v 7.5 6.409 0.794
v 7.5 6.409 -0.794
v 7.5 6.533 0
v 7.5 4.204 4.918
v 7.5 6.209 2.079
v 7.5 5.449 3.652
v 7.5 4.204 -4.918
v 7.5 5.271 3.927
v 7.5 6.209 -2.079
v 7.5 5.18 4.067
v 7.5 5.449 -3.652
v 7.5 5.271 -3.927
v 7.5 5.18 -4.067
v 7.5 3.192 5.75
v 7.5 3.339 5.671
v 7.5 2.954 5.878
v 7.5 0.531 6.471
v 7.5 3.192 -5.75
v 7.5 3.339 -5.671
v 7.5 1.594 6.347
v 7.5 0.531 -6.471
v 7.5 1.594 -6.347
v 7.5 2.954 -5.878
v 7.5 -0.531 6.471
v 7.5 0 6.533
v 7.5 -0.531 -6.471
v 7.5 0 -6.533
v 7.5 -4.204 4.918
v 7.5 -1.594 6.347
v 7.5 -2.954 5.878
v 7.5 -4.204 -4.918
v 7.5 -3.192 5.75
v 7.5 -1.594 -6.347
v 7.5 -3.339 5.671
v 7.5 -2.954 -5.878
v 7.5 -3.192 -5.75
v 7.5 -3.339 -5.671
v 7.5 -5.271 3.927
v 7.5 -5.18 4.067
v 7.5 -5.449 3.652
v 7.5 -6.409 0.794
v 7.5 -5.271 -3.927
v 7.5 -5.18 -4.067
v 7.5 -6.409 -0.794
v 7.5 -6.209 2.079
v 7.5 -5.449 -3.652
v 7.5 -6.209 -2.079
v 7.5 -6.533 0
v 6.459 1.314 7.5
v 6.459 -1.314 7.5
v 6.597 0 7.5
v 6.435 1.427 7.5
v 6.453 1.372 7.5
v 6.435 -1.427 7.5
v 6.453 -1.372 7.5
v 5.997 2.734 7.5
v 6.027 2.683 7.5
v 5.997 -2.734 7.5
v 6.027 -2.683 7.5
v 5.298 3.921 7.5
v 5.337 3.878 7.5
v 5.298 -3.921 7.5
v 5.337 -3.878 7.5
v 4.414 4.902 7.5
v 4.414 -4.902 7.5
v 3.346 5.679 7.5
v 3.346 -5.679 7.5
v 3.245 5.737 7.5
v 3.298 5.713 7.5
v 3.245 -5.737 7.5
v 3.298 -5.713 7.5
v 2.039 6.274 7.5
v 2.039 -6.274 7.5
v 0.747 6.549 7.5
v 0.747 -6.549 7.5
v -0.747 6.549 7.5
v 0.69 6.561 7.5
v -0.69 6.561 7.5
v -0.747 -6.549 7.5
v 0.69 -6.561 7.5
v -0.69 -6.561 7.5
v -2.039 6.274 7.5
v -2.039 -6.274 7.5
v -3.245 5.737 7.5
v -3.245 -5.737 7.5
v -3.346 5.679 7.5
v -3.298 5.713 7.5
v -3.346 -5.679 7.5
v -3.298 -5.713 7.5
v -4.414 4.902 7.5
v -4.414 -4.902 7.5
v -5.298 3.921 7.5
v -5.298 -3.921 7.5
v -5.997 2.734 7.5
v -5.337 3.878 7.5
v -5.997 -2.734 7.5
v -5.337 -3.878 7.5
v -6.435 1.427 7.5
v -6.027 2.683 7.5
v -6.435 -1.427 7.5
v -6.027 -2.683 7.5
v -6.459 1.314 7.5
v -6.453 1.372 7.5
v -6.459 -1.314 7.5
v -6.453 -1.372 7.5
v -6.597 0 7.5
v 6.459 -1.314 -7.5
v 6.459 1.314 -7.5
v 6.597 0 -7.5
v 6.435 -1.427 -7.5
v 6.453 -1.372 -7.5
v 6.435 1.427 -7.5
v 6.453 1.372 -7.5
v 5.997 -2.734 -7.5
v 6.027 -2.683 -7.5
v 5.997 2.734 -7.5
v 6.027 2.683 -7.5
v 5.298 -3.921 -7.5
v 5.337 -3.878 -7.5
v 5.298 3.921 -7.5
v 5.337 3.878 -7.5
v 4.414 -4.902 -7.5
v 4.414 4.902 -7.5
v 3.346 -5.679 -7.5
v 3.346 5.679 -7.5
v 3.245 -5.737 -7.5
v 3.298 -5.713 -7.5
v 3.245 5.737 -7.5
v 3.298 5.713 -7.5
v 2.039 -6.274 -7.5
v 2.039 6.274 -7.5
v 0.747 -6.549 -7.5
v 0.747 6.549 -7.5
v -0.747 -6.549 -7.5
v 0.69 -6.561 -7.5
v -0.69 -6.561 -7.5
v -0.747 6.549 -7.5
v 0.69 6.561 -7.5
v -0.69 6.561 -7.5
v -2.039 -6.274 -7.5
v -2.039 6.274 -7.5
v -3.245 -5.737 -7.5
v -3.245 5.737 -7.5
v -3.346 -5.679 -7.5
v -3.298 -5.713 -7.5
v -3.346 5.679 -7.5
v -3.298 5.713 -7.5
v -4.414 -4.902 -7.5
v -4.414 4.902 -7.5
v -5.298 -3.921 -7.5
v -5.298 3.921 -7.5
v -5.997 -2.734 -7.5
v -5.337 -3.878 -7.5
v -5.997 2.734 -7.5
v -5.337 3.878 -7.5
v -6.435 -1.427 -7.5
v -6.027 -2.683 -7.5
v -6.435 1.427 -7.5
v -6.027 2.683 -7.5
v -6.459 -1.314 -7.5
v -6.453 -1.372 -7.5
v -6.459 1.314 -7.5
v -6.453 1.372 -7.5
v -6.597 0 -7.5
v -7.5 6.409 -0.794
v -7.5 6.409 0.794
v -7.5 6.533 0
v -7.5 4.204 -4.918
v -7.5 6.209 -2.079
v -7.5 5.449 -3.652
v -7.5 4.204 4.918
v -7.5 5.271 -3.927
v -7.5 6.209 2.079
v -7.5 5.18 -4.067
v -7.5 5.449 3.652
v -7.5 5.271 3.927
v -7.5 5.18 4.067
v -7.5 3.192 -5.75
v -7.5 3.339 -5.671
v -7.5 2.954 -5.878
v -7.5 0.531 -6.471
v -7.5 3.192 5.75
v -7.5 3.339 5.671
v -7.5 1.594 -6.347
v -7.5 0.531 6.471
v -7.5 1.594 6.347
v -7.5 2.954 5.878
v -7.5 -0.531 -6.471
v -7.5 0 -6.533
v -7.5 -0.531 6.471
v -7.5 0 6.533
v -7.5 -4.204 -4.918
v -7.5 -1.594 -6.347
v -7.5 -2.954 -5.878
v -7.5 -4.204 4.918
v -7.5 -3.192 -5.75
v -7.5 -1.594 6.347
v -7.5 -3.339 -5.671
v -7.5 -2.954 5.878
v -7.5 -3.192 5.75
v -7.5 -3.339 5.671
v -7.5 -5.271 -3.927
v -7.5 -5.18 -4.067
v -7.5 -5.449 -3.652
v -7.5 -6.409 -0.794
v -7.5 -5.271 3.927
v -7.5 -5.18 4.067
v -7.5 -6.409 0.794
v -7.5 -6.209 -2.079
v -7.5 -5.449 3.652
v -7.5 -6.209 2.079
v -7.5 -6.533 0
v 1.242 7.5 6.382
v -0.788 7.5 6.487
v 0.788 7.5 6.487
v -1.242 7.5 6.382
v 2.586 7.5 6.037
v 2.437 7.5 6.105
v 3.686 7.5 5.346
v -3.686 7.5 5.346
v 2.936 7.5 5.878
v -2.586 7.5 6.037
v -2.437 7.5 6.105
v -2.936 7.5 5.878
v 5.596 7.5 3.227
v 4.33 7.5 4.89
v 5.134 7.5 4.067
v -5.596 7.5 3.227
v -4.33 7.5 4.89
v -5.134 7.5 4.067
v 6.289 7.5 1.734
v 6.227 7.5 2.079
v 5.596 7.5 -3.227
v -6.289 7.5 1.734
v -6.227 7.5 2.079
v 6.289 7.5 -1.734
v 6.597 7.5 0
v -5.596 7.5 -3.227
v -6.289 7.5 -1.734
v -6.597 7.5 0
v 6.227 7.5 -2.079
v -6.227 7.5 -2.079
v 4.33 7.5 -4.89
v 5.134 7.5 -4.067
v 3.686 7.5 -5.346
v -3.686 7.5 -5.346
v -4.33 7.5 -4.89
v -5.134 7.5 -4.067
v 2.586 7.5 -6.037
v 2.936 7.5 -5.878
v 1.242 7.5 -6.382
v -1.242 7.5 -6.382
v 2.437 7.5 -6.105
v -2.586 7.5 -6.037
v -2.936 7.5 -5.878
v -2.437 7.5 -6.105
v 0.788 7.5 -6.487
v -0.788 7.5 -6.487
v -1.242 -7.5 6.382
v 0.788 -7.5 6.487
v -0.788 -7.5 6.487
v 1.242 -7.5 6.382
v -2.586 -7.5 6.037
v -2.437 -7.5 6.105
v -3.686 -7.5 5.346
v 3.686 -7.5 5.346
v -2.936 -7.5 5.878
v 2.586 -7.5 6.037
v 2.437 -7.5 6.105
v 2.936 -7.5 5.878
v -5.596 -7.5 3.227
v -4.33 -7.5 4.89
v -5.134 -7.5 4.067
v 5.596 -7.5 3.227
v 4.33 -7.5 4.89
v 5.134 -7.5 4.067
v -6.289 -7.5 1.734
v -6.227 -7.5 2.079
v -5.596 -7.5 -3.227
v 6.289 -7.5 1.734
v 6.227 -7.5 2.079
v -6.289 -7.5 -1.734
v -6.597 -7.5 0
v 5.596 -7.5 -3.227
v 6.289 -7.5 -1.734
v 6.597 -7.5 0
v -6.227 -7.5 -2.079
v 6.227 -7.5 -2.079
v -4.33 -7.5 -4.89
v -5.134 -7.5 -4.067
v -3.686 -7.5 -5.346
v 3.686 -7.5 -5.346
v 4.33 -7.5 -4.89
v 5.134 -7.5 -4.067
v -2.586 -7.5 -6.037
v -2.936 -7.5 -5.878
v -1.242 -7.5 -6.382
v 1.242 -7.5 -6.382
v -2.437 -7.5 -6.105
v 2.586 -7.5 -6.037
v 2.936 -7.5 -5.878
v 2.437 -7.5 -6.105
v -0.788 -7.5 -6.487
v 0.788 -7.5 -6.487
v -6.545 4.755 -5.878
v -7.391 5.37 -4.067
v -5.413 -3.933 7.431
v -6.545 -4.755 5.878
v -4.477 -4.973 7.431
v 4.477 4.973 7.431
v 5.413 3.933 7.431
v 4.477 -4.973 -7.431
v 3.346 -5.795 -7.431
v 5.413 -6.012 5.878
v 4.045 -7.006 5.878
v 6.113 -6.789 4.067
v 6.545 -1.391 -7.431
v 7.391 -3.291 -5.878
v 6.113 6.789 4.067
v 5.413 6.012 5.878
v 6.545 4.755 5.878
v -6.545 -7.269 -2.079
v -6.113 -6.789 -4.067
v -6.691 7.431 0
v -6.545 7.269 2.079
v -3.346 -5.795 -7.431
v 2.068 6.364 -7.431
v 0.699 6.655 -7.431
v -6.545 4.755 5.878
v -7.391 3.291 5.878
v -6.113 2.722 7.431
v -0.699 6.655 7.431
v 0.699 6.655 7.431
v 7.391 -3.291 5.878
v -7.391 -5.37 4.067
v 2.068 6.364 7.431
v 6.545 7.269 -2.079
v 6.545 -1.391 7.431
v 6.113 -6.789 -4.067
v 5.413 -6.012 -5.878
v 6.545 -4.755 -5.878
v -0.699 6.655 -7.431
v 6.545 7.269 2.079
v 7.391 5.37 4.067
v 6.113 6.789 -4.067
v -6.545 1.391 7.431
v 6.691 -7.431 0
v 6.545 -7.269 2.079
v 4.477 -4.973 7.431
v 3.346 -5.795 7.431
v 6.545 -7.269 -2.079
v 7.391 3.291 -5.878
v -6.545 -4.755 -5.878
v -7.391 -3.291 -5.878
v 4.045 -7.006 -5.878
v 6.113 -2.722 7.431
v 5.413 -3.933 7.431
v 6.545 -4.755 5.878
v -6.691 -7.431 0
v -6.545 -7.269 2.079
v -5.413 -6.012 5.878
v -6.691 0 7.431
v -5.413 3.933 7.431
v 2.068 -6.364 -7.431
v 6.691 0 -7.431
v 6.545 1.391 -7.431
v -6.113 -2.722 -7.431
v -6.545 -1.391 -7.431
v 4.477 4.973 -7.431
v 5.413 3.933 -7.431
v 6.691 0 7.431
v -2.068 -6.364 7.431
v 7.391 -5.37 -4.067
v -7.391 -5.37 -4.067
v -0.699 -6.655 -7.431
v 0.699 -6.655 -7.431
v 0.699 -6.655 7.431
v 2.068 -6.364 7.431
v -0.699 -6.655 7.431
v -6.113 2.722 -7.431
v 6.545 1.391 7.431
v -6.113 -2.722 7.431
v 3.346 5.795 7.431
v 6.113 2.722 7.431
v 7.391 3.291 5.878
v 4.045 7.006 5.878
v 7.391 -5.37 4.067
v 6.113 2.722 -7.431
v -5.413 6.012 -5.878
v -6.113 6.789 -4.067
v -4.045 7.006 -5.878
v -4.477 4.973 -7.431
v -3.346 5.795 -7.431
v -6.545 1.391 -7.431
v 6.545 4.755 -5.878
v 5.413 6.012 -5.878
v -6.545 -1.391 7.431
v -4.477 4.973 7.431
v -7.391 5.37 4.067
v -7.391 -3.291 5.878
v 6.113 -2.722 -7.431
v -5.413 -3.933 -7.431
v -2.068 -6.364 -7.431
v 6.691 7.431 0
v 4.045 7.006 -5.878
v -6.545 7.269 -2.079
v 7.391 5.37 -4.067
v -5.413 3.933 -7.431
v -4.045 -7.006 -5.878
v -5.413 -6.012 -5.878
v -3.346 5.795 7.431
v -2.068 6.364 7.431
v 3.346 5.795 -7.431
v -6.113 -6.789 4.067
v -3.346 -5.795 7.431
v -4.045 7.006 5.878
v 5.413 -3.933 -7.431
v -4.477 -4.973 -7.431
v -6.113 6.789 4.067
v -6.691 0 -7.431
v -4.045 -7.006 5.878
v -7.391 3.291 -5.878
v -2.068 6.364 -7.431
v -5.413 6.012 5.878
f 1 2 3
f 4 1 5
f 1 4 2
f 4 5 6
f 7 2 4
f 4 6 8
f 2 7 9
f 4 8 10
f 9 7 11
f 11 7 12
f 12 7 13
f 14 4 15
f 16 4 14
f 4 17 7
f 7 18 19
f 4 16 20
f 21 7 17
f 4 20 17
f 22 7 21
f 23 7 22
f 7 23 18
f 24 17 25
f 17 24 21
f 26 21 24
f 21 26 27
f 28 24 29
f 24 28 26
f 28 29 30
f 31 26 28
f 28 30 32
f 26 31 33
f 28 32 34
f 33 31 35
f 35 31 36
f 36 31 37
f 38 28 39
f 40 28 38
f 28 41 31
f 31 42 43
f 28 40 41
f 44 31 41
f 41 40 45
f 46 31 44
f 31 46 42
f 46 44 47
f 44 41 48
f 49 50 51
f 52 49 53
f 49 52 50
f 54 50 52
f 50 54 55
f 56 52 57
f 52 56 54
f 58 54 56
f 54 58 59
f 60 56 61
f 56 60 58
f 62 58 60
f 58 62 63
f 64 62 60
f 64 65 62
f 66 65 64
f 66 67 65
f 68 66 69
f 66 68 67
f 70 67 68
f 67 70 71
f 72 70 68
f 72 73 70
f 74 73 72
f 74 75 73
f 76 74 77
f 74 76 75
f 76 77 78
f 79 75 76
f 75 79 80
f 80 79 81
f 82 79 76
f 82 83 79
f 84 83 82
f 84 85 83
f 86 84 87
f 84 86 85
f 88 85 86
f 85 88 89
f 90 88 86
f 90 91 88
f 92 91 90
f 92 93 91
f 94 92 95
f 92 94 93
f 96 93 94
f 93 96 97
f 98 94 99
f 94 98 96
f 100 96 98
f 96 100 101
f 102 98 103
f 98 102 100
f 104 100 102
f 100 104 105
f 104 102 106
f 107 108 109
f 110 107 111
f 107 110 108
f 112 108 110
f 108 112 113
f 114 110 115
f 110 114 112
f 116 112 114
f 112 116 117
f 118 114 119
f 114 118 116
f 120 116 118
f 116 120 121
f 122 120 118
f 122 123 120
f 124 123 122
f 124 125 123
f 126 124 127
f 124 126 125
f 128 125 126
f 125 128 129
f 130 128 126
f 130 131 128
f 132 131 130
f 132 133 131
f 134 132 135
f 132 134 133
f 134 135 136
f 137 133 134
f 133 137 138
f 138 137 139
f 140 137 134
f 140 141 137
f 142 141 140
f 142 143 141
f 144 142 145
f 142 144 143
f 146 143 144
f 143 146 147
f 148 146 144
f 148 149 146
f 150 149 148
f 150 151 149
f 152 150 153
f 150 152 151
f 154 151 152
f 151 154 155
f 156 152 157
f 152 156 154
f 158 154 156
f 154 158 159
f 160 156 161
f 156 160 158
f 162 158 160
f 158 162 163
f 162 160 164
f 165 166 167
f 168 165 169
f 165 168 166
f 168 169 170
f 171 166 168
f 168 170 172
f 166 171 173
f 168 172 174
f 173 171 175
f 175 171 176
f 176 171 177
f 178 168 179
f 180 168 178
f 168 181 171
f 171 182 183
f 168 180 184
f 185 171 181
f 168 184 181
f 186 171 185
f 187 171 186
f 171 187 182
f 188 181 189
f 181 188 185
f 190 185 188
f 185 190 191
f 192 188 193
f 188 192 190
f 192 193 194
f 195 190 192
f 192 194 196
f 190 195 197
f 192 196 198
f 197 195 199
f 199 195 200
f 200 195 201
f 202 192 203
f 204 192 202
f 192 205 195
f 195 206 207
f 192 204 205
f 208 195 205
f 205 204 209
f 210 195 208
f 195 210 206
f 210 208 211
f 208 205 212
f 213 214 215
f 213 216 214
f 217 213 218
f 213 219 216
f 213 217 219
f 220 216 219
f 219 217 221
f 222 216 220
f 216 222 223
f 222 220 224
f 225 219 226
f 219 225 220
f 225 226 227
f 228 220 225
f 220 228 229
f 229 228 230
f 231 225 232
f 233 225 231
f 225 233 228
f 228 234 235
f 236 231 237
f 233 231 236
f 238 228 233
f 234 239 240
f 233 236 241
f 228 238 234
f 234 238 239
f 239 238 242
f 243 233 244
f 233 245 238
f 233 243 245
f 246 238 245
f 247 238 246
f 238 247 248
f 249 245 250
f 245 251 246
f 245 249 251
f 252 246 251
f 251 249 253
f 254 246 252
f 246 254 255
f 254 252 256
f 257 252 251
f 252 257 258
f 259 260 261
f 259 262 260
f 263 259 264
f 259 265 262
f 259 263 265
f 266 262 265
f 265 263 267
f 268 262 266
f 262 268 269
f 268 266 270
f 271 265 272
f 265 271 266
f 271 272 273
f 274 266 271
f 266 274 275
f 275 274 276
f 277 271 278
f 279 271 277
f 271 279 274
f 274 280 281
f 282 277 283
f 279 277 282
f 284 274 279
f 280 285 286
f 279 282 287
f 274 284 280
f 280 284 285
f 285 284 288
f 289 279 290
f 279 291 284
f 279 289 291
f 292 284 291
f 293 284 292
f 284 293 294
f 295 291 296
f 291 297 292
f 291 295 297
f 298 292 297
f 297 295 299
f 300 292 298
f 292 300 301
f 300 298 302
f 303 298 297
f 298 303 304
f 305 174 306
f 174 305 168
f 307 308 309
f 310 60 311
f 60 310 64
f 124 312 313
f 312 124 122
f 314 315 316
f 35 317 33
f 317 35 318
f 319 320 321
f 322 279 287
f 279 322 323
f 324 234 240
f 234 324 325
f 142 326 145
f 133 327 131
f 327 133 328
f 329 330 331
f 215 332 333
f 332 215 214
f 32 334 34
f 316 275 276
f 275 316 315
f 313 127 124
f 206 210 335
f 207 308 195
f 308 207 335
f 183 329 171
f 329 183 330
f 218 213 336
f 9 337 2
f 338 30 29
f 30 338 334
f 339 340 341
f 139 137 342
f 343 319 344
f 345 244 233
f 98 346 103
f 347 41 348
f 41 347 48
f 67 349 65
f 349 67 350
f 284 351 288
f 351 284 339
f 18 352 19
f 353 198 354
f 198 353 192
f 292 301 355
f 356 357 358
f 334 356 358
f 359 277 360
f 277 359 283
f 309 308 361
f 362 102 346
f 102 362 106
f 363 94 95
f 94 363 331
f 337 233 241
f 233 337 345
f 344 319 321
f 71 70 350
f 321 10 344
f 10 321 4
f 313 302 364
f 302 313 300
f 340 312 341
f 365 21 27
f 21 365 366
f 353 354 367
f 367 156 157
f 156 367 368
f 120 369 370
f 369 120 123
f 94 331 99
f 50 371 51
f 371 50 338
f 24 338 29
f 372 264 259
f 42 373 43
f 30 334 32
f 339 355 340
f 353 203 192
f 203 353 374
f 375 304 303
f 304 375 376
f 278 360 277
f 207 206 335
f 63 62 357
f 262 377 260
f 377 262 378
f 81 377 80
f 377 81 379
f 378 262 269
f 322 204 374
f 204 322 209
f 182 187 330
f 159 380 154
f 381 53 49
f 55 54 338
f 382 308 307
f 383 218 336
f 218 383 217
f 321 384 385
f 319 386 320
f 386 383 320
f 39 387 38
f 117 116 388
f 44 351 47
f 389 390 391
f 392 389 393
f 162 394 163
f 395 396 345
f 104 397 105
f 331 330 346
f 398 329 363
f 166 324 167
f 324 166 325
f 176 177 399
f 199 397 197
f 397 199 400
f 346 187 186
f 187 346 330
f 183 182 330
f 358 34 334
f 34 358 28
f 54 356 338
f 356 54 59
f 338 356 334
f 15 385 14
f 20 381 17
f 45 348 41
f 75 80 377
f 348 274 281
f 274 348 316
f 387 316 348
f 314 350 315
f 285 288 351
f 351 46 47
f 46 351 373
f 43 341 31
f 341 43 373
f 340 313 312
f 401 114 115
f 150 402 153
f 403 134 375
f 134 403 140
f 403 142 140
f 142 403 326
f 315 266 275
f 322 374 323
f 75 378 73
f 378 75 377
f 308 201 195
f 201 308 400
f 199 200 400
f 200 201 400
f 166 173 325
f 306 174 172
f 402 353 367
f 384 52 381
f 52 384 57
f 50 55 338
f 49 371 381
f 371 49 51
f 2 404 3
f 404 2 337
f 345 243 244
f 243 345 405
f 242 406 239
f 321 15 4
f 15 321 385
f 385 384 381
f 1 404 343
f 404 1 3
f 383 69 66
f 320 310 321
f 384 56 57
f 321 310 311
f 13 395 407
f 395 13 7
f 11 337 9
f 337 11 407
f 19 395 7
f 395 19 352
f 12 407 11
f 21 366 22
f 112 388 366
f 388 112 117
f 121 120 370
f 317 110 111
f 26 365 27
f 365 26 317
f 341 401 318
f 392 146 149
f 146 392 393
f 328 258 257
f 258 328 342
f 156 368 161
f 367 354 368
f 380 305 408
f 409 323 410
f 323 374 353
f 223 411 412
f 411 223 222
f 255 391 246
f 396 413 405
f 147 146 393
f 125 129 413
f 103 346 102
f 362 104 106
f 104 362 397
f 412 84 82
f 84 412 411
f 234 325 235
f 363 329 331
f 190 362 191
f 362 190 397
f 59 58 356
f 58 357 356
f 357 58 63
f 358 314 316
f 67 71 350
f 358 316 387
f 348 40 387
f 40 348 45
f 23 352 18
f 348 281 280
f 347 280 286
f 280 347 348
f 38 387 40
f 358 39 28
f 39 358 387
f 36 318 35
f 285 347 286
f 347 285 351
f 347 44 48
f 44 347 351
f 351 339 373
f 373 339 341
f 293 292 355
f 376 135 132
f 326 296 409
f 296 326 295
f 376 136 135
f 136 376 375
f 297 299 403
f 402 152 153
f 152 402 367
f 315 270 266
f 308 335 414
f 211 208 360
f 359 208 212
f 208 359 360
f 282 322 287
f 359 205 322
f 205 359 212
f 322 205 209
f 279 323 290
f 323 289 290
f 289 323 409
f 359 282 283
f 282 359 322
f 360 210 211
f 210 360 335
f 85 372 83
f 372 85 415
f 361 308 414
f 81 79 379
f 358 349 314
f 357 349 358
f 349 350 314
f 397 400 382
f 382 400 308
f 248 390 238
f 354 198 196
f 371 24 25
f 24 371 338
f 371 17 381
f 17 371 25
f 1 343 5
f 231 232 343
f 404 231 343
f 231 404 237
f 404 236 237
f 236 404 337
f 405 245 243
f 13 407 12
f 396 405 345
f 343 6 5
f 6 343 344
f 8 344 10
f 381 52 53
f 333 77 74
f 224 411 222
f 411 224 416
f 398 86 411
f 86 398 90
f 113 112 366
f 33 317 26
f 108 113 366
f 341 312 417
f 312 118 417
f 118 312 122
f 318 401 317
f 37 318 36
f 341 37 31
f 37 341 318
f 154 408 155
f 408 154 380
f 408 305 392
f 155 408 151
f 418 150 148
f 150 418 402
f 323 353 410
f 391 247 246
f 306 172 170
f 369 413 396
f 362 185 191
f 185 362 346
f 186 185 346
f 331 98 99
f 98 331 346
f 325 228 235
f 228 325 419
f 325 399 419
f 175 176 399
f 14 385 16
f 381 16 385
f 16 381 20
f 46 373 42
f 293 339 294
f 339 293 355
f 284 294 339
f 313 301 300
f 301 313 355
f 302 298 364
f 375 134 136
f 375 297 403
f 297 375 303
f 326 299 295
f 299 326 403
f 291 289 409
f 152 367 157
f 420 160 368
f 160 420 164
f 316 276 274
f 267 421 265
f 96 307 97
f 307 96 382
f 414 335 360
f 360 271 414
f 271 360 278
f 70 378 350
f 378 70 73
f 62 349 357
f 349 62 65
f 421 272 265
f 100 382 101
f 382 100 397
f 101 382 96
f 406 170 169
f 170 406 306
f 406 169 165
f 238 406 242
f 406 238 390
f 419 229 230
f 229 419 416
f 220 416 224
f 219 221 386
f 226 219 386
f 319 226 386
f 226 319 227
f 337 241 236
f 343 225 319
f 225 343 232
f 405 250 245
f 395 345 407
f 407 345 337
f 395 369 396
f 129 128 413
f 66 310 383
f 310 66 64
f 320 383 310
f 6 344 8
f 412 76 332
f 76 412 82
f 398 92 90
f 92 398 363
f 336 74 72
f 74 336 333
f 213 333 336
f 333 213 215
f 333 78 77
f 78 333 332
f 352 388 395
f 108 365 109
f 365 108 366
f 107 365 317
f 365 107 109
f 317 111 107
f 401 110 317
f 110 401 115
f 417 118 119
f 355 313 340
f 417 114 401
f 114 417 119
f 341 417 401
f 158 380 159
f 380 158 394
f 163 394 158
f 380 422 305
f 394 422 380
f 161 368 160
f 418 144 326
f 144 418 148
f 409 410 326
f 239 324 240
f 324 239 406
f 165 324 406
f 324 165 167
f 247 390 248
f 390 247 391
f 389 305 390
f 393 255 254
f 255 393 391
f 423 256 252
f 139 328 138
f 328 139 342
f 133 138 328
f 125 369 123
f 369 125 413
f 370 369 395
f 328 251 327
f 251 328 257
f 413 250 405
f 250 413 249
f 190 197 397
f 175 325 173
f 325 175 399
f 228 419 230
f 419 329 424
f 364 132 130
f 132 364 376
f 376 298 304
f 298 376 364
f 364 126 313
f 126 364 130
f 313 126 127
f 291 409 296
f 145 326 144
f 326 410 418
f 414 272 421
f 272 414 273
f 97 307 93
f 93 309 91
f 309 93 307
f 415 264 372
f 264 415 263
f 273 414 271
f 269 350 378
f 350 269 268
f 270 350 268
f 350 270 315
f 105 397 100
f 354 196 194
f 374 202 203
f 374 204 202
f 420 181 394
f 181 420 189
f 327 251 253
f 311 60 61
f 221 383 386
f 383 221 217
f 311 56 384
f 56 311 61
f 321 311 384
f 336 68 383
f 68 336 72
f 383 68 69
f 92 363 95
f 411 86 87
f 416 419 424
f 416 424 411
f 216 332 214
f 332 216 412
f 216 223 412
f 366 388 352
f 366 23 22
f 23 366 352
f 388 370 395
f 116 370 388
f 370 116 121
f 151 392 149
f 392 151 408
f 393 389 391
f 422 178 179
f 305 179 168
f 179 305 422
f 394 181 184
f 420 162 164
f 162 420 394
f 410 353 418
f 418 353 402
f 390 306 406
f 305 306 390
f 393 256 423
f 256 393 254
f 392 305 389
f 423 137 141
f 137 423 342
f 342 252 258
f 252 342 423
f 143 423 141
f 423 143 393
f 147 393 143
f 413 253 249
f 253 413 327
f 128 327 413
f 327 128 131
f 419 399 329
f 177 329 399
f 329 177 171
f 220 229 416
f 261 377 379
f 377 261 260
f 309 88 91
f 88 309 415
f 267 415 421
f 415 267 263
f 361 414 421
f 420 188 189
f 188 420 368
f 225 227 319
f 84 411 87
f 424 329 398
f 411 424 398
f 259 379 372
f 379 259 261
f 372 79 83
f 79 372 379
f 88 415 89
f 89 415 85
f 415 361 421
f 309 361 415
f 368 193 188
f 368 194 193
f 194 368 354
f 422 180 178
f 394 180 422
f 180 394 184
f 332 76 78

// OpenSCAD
// The exact-geometry audit's case c02 (docs/audits/exact-geometry-rust.md).
// volume: 3108.867730114899
intersection() { cube(15, center=true); sphere(10); }
